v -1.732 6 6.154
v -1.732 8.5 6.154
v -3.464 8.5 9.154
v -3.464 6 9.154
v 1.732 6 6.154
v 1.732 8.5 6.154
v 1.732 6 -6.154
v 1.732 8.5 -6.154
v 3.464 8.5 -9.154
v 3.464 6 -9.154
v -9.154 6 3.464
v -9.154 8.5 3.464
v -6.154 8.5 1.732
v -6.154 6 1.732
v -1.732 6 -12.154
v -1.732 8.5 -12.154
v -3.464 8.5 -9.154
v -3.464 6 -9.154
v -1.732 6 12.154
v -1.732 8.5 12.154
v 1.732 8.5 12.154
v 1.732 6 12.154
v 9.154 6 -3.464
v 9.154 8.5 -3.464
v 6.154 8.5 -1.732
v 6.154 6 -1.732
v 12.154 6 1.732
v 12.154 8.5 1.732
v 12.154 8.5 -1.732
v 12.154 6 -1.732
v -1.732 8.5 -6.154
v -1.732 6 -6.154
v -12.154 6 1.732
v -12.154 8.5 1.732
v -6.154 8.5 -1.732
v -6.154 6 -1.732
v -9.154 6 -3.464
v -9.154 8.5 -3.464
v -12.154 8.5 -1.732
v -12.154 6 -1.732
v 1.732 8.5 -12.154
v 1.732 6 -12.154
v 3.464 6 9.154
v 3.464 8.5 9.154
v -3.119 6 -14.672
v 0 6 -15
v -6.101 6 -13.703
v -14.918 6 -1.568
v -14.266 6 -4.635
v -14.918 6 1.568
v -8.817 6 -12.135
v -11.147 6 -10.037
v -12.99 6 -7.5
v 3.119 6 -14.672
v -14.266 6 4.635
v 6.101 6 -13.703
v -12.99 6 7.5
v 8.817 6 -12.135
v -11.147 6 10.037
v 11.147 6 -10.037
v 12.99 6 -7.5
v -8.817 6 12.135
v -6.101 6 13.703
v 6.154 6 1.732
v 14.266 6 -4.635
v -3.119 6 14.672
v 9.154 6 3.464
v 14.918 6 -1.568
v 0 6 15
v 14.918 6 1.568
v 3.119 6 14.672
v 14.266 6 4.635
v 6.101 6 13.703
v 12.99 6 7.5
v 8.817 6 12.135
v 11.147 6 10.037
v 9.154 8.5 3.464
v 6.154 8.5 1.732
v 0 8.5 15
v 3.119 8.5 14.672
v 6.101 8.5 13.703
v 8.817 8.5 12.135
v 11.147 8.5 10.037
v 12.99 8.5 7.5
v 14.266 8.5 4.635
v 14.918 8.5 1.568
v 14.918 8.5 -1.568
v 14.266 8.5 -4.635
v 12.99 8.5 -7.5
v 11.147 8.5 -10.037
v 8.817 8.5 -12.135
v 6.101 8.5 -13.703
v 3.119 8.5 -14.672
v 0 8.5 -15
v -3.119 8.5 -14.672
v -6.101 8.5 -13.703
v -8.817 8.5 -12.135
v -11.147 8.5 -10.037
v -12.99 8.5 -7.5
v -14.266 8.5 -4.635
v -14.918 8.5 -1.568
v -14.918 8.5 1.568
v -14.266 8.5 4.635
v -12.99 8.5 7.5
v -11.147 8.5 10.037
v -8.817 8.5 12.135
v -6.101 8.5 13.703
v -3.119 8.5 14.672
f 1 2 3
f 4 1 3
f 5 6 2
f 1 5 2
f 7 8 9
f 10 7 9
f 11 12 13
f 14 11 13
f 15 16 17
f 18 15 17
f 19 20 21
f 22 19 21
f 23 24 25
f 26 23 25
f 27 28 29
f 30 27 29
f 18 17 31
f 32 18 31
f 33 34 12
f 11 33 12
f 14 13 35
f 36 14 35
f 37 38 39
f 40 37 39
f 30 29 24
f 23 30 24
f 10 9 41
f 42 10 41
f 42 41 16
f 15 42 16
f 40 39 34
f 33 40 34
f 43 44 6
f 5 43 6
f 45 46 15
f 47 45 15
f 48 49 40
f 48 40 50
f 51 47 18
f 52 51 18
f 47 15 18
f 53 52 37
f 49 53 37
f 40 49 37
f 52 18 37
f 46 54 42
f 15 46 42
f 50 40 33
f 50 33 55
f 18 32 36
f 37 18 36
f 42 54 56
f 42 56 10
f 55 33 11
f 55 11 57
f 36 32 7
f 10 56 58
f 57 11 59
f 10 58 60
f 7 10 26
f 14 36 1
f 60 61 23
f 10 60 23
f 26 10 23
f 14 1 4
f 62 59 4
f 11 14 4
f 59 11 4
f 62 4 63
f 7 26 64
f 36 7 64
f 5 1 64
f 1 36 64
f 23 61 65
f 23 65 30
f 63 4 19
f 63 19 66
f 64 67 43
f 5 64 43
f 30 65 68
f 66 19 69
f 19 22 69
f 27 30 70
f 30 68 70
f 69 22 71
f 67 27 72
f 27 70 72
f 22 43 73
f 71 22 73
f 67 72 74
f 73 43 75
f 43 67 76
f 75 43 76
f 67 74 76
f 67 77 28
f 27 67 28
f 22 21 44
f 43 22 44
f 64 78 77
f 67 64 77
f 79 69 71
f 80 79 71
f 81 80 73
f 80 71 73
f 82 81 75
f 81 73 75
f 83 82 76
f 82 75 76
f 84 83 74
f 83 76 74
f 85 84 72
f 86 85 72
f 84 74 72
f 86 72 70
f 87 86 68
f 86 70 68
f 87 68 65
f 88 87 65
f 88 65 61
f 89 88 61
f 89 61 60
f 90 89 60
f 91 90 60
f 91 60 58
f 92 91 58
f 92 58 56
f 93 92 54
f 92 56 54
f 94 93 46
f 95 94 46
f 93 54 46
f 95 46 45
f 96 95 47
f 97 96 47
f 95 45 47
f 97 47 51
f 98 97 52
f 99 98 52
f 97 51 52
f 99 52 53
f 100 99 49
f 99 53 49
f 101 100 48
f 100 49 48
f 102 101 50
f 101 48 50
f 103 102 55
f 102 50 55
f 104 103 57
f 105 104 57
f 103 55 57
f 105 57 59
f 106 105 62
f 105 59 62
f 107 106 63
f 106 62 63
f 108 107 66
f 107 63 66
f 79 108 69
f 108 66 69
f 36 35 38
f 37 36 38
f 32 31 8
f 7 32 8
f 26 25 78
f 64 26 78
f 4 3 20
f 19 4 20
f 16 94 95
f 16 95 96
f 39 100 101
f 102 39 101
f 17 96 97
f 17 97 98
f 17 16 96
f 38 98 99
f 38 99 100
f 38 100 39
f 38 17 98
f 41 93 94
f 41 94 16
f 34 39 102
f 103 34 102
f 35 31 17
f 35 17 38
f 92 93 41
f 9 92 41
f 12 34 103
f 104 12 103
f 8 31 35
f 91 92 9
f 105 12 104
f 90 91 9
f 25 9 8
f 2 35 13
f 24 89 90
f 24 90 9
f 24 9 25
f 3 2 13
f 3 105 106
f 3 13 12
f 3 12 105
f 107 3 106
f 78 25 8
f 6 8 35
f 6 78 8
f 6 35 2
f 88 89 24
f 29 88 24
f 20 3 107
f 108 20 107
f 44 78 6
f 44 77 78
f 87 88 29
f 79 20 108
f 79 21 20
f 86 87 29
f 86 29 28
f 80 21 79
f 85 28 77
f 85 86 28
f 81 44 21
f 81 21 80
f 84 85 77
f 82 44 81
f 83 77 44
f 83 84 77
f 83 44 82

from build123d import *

# Parameters (mm, degrees)
CROQUIS1_R              = 8.5
SALIENTE_EXTRUIR1_DEPTH = 2
CROQUIS2_R              = 7.5
SALIENTE_EXTRUIR2_DEPTH = 4
CROQUIS3_R              = 15
SALIENTE_EXTRUIR3_DEPTH = 2.5
REDONDEO1_R             = 3
CORTAR_EXTRUIR1_DEPTH   = 2.5
CROQUIS5_R              = 8.5
CORTAR_EXTRUIR2_DEPTH   = 10


with BuildPart() as part:
    # Croquis1 → Saliente-Extruir1 (new body)
    with BuildSketch(Plane(origin=(0, 0, 0), x_dir=(1, 0, 0), z_dir=(0, 1, 0))):
        with Locations(Location((0, 0, 0), (0, 0, 270))):
            Circle(CROQUIS1_R)
    extrude(amount=SALIENTE_EXTRUIR1_DEPTH)

    # Croquis2 → Saliente-Extruir2 (add)
    with BuildSketch(Plane(origin=(0, 2, 0), x_dir=(1, 0, 0), z_dir=(0, 1, 0))):
        with Locations(Location((0, 0, 0), (0, 0, 270))):
            Circle(CROQUIS2_R)
    extrude(amount=SALIENTE_EXTRUIR2_DEPTH)

    # Croquis3 → Saliente-Extruir3 (add)
    with BuildSketch(Plane(origin=(0, 6, 0), x_dir=(1, 0, 0), z_dir=(0, 1, 0))):
        with Locations(Location((0, 0, 0), (0, 0, 270))):
            Circle(CROQUIS3_R)
    extrude(amount=SALIENTE_EXTRUIR3_DEPTH)

    # Redondeo1
    # the kernel refuses this fillet: 3 mm, written as the material it takes off along each edge
    with BuildSketch(Plane(origin=(0, 0, 0), x_dir=(0, 0, 1), z_dir=(-1, 0, 0))) as redondeo1_piece_1:
        with BuildLine():
            CenterArc((5.671572875, 3), REDONDEO1_R, 270, 70.528779366)
            Line((5.671572875, 0), (5.671572875, -0.06))
            Line((5.671572875, -0.06), (8.5, -0.06))
            Line((8.5, -0.06), (8.56, 0))
            ThreePointArc((8.56, 0), (8.56, 1), (8.556568542, 1.98))
            Line((8.556568542, 1.98), (8.5, 2))
        make_face()
    revolve(axis=Axis((0, 0, 0), (0, 1, 0)), mode=Mode.SUBTRACT)

    # Croquis4 → Cortar-Extruir1 (cut)
    with BuildSketch(Plane(origin=(0, 8.5, 0), x_dir=(1, 0, 0), z_dir=(0, 1, 0))):
        Polygon((12.154001459, -1.732050808), (12.154001459, 1.732050808), (9.154001459, 3.464101615), (6.154001459, 1.732050808), (6.154001459, -1.732050808), (9.154001459, -3.464101615), align=None)
        Polygon((3.464101615, 9.154001459), (1.732050808, 12.154001459), (-1.732050808, 12.154001459), (-3.464101615, 9.154001459), (-1.732050808, 6.154001459), (1.732050808, 6.154001459), align=None)
        Polygon((-1.732050808, -12.154001459), (1.732050808, -12.154001459), (3.464101615, -9.154001459), (1.732050808, -6.154001459), (-1.732050808, -6.154001459), (-3.464101615, -9.154001459), align=None)
        Polygon((-12.154001459, 1.732050808), (-12.154001459, -1.732050808), (-9.154001459, -3.464101615), (-6.154001459, -1.732050808), (-6.154001459, 1.732050808), (-9.154001459, 3.464101615), align=None)
    extrude(amount=-CORTAR_EXTRUIR1_DEPTH, mode=Mode.SUBTRACT)

    # Croquis5 → Cortar-Extruir2 (cut)
    with BuildSketch(Plane.XZ.offset(-6)):
        Circle(CROQUIS5_R)
    extrude(amount=CORTAR_EXTRUIR2_DEPTH, mode=Mode.SUBTRACT)


solid = part.part
